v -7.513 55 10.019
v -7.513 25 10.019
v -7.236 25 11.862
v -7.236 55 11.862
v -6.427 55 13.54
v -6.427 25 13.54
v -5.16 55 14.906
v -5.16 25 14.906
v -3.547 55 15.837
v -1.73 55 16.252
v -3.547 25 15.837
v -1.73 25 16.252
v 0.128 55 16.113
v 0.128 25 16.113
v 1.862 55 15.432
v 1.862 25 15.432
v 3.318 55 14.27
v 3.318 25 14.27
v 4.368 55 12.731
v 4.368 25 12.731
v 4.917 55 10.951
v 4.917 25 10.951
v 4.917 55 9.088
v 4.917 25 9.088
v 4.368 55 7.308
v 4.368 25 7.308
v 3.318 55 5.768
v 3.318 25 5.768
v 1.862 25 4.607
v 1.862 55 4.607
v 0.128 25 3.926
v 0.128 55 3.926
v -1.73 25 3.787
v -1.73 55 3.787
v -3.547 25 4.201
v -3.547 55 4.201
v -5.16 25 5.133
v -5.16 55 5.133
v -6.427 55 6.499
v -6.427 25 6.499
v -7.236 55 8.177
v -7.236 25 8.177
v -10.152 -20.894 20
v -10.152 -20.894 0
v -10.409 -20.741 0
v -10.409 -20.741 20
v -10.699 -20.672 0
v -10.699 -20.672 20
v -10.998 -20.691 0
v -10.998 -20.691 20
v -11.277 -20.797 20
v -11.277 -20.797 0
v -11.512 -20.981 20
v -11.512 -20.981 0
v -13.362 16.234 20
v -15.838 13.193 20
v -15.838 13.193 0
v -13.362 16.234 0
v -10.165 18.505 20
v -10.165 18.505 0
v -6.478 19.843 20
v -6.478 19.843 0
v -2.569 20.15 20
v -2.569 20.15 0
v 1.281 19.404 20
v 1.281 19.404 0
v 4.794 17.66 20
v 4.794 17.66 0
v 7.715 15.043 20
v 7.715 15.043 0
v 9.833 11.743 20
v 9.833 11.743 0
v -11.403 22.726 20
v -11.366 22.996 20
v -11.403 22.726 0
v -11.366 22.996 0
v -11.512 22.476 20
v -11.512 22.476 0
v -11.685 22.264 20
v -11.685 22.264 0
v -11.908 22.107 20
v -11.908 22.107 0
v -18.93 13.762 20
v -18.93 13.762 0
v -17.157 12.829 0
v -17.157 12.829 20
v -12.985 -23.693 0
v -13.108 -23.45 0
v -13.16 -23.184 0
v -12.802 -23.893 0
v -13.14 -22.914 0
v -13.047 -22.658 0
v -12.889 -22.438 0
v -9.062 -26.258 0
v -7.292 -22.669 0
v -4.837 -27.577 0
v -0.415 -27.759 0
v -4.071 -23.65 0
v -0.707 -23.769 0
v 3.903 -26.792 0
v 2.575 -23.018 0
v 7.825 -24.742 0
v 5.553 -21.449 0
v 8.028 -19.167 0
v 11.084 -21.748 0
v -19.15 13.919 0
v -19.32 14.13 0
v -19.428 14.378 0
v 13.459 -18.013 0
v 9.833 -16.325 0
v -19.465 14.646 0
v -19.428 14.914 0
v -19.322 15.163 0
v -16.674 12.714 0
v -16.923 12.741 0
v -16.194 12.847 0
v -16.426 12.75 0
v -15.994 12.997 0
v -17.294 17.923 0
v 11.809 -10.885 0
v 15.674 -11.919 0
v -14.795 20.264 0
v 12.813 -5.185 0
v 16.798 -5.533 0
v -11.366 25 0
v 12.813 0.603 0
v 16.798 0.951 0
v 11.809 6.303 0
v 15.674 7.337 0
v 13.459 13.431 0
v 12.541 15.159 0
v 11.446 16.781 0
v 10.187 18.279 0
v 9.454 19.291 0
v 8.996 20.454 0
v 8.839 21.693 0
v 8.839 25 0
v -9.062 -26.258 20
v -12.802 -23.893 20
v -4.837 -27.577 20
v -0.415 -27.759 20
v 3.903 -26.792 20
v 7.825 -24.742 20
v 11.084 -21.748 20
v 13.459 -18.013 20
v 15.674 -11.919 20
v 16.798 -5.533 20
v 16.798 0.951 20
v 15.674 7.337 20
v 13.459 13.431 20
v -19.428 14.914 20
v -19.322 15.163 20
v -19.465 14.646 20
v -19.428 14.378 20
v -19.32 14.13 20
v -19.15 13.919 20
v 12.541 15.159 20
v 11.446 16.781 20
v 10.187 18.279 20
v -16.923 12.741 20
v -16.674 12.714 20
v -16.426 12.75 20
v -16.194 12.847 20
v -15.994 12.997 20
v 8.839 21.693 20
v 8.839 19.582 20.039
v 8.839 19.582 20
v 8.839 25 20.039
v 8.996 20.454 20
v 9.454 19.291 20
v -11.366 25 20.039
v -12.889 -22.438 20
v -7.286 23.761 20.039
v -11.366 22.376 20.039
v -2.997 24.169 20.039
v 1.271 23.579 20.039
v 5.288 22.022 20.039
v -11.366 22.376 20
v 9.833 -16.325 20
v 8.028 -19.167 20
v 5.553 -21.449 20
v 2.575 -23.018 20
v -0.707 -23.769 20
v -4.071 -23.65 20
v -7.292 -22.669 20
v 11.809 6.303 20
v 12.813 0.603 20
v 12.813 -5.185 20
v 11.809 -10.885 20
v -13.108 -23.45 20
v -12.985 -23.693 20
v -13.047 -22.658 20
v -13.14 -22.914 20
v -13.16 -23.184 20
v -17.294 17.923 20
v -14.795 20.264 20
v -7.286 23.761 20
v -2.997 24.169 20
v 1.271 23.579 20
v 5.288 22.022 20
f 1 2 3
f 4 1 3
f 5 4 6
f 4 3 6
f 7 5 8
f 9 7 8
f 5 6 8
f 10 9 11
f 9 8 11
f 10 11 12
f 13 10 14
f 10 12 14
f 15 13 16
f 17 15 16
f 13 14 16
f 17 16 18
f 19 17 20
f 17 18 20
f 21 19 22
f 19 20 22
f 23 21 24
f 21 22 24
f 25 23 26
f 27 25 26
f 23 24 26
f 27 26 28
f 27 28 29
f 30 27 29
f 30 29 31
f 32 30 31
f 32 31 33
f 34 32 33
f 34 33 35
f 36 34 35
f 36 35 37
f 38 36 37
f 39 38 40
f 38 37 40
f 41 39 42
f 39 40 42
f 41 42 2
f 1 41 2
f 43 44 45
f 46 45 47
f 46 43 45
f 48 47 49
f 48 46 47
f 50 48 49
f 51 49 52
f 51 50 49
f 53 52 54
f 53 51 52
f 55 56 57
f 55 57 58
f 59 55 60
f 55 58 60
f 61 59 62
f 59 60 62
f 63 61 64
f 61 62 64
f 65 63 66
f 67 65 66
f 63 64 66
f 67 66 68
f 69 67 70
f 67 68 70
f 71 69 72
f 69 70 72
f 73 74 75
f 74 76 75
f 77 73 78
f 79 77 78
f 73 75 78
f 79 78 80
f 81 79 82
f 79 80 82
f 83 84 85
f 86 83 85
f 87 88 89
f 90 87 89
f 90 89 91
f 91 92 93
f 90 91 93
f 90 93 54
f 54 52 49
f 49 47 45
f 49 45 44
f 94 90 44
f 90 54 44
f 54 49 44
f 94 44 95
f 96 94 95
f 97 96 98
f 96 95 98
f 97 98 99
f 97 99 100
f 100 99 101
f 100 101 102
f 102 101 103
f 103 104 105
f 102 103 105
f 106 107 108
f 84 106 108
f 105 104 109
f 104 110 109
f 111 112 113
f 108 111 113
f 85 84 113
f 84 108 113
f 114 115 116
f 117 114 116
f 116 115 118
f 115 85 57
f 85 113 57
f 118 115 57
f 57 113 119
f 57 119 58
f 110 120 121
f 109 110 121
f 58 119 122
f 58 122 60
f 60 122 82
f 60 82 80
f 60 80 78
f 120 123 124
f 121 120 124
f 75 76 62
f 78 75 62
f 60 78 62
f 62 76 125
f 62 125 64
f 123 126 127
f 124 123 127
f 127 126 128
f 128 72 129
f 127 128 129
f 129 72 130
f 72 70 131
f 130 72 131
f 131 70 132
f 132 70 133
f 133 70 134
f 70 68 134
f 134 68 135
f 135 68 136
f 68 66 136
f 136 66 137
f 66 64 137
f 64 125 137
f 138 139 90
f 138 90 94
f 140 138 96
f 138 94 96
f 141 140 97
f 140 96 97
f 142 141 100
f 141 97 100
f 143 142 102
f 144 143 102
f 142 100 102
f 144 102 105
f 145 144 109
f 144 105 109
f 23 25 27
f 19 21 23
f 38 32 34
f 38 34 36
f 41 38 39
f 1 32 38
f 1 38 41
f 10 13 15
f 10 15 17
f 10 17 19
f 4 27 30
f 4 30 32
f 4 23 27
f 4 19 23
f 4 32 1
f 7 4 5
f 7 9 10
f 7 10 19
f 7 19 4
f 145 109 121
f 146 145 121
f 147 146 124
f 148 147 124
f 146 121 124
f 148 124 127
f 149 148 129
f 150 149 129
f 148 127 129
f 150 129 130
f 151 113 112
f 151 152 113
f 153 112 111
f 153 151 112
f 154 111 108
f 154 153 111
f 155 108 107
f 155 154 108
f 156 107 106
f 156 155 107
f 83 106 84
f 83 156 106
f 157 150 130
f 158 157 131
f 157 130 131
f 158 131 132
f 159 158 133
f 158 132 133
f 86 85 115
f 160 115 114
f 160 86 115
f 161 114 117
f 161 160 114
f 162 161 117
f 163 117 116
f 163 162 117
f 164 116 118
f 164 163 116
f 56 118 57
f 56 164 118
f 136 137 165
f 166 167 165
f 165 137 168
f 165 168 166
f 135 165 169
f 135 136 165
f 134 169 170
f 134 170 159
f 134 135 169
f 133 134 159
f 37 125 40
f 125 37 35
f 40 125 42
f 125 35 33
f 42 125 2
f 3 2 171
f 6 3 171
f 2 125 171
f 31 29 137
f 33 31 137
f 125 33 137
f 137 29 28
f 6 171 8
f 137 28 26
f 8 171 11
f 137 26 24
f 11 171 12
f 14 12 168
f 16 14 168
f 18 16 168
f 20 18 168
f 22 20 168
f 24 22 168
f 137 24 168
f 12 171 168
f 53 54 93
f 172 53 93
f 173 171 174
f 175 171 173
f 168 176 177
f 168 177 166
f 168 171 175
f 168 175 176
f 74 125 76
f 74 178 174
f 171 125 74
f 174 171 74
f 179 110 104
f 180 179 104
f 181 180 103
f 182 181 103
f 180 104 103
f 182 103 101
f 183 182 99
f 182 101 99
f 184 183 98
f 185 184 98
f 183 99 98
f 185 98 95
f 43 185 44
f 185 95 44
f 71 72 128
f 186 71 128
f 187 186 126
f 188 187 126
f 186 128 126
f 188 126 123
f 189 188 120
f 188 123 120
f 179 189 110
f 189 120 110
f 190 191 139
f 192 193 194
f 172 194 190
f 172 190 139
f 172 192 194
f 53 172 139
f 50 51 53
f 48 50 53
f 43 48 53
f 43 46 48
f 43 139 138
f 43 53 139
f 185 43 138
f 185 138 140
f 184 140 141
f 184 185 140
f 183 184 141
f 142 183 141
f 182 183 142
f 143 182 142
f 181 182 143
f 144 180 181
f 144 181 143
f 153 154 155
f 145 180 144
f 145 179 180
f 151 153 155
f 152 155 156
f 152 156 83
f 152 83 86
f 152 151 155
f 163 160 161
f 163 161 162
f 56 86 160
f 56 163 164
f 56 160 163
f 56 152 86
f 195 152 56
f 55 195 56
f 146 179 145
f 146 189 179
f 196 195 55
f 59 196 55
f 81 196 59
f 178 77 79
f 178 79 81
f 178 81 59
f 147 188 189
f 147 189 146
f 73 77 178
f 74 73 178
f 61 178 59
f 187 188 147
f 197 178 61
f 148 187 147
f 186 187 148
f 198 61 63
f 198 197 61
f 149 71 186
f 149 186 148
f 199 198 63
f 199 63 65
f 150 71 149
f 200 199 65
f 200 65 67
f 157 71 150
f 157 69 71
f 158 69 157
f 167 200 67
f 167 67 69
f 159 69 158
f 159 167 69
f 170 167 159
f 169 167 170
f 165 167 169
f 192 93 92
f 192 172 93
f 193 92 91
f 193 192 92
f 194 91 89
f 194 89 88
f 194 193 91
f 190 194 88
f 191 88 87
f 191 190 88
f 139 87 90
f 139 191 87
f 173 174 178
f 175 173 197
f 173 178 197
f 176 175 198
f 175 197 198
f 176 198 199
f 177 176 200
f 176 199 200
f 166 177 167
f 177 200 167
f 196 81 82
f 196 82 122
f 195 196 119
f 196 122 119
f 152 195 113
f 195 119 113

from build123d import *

# Parameters (mm, degrees)
F1_DEPTH      = 20
F4_END_RADIUS = 18.58687693
F3_W          = 20.205357112
F3_H          = 20.0386047363
F4_REACH      = 81.284821593
F5_R          = 1
F6_R          = 5
F7_R          = 1
F8_R          = 6.25
F9_DEPTH      = 30


# Not quite as in the source:
# - a feature of the source that left no trace in its solid (it failed there, or was rolled back) is left out


with BuildPart() as f1:
    # F0 (on Top) → F1 (new body)
    with BuildSketch(Plane.XY):
        with BuildLine():
            ThreePointArc((-16.300464081, 12.3786436003), (-3.0365664125, 20.1688822052), (9.8326279785, 11.7425760982))
            ThreePointArc((9.8326279785, 11.7425760982), (12.939174946, -2.2913182786), (9.8326279785, -16.3252126554))
            ThreePointArc((9.8326279785, -16.3252126554), (0.5036385974, -23.5957971339), (-10.8497184243, -20.2802691412))
            Line((-10.8497184243, -20.2802691412), (-13.5972941331, -23.1872998815))
            ThreePointArc((-13.5972941331, -23.1872998815), (1.2549394728, -27.5246070039), (13.4589359939, -18.0133744302))
            ThreePointArc((13.4589359939, -18.0133744302), (16.939174946, -2.2913182786), (13.4589359939, 13.430737873))
            ThreePointArc((13.4589359939, 13.430737873), (-2.9392370682, 24.1676979047), (-19.8403485782, 14.2412272216))
            Line((-19.8403485782, 14.2412272216), (-16.300464081, 12.3786436003))
        make_face()
    extrude(amount=F1_DEPTH)

    f4_end = (Plane(origin=(-3.391499204, 5.5863240865, 10), x_dir=(-1, 0, 0), z_dir=(0, 0, -1)) * Cylinder(F4_END_RADIUS, 296.0871828679, mode=Mode.PRIVATE)).faces().sort_by_distance((-2.9392370682, 24.1676979047, 10))[0]
    # F3 (on offset) → F4 (join, up to the whole of a round face its end follows)
    with BuildSketch(Plane.XZ.offset(-25)):
        with Locations((-1.2632482685, 10.0193023682)):
            Rectangle(F3_W, F3_H)
    f4_long = extrude(amount=F4_REACH, mode=Mode.PRIVATE)
    add(split(f4_long, bisect_by=f4_end, keep=Keep.ALL, mode=Mode.PRIVATE).solids().sort_by_distance((-1.2632482685, 25, 10.0193023682))[0])

    # F5
    f5_edges = [f1.edges().sort_by_distance(p)[0] for p in [
        (-16.300464, 12.378644, 10),
        (-19.840349, 14.241227, 10),
        (-10.849718, -20.280269, 10),
        (-13.597294, -23.1873, 10),
    ]]
    fillet(f5_edges, radius=F5_R)

    # F6
    f6_edges = [f1.edges().sort_by_distance(p)[0] for p in [
        (8.83943, 19.581908, 10),
    ]]
    fillet(f6_edges, radius=F6_R)

    # F7
    f7_edges = [f1.edges().sort_by_distance(p)[0] for p in [
        (-11.365927, 22.375621, 10),
    ]]
    fillet(f7_edges, radius=F7_R)

    # F8 (on face) → F9 (join)
    with BuildSketch(Plane(origin=(0, 25, 0), x_dir=(-1, 0, 0), z_dir=(0, 1, 0))):
        with Locations((1.2632482685, 10.0193023682)):
            Circle(F8_R)
    extrude(amount=F9_DEPTH)


solid = f1.part
